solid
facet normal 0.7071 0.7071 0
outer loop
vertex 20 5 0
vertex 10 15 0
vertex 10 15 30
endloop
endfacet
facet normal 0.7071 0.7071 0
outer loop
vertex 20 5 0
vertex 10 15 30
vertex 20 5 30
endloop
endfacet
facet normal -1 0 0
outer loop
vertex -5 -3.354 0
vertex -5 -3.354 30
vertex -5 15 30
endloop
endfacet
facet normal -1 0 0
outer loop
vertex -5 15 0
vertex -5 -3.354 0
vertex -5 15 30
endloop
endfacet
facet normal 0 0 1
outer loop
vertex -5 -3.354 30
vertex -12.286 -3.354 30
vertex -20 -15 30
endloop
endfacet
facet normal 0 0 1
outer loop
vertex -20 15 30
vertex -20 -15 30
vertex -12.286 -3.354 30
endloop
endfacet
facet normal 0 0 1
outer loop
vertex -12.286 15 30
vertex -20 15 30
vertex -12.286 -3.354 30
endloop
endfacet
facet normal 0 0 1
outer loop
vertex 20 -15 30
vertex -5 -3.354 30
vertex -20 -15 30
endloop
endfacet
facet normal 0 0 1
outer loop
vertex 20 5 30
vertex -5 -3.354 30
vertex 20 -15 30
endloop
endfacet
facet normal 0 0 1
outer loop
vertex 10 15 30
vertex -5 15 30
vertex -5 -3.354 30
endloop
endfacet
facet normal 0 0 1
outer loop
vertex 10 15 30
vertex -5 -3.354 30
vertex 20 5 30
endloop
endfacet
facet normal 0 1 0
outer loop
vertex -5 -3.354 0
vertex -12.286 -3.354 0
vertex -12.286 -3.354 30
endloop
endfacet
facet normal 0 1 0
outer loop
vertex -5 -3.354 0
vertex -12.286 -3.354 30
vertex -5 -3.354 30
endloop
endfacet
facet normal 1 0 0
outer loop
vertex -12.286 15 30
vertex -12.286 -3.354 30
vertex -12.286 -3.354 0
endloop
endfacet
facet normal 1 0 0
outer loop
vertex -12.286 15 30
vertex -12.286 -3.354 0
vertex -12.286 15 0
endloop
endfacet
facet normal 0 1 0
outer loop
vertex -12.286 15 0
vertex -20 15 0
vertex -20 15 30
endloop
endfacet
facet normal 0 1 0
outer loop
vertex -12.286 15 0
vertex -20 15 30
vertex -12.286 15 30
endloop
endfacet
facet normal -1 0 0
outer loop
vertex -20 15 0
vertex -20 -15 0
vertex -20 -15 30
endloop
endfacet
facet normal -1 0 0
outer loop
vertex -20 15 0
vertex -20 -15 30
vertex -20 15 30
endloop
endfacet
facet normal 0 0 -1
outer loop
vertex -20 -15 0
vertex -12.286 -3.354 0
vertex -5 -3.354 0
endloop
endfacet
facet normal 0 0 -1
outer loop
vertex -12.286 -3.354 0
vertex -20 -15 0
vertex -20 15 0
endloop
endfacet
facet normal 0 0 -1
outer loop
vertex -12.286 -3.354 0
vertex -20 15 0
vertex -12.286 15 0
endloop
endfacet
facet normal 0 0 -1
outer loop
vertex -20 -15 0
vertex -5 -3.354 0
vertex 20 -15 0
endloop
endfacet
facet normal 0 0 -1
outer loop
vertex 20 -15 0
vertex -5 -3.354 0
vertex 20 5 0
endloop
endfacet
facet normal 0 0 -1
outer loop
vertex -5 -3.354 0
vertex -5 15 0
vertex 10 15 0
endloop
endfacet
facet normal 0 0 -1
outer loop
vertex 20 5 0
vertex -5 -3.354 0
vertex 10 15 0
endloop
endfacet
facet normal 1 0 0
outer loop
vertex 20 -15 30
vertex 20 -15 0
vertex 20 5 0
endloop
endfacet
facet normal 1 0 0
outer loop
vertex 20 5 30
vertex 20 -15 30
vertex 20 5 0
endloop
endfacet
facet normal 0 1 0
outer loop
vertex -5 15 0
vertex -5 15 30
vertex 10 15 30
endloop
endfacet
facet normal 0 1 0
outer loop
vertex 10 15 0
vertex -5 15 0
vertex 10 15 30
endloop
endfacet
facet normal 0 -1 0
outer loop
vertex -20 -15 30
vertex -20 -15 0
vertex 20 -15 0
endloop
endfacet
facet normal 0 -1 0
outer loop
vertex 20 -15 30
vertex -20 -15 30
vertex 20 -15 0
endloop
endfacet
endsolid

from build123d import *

# Parameters (mm, degrees)
SKETCH_1_W          = 40
SKETCH_1_H          = 30
EXTRUDE_1_DEPTH     = 30
CUT_EXTRUDE_1_DEPTH = 43
SKETCH_3_W          = 7.285636578
SKETCH_3_H          = 18.354132306
CUT_EXTRUDE_2_DEPTH = 30


with BuildPart() as part:
    # 草圖1 → 填料-伸長1 (new body)
    with BuildSketch(Plane.XY):
        Rectangle(SKETCH_1_W, SKETCH_1_H)
    extrude(amount=EXTRUDE_1_DEPTH)

    # 草圖2 → 除料-伸長1 (cut)
    with BuildSketch(Plane.XY.offset(30)):
        Polygon((10, 15), (20, 5), (20, 15), align=None)
    extrude(amount=-CUT_EXTRUDE_1_DEPTH, mode=Mode.SUBTRACT)

    # 草圖3 → 除料-伸長2 (cut)
    with BuildSketch(Plane.XY.offset(30)):
        with Locations((-8.642818289, 5.822933847)):
            Rectangle(SKETCH_3_W, SKETCH_3_H)
    extrude(amount=-CUT_EXTRUDE_2_DEPTH, mode=Mode.SUBTRACT)


solid = part.part
